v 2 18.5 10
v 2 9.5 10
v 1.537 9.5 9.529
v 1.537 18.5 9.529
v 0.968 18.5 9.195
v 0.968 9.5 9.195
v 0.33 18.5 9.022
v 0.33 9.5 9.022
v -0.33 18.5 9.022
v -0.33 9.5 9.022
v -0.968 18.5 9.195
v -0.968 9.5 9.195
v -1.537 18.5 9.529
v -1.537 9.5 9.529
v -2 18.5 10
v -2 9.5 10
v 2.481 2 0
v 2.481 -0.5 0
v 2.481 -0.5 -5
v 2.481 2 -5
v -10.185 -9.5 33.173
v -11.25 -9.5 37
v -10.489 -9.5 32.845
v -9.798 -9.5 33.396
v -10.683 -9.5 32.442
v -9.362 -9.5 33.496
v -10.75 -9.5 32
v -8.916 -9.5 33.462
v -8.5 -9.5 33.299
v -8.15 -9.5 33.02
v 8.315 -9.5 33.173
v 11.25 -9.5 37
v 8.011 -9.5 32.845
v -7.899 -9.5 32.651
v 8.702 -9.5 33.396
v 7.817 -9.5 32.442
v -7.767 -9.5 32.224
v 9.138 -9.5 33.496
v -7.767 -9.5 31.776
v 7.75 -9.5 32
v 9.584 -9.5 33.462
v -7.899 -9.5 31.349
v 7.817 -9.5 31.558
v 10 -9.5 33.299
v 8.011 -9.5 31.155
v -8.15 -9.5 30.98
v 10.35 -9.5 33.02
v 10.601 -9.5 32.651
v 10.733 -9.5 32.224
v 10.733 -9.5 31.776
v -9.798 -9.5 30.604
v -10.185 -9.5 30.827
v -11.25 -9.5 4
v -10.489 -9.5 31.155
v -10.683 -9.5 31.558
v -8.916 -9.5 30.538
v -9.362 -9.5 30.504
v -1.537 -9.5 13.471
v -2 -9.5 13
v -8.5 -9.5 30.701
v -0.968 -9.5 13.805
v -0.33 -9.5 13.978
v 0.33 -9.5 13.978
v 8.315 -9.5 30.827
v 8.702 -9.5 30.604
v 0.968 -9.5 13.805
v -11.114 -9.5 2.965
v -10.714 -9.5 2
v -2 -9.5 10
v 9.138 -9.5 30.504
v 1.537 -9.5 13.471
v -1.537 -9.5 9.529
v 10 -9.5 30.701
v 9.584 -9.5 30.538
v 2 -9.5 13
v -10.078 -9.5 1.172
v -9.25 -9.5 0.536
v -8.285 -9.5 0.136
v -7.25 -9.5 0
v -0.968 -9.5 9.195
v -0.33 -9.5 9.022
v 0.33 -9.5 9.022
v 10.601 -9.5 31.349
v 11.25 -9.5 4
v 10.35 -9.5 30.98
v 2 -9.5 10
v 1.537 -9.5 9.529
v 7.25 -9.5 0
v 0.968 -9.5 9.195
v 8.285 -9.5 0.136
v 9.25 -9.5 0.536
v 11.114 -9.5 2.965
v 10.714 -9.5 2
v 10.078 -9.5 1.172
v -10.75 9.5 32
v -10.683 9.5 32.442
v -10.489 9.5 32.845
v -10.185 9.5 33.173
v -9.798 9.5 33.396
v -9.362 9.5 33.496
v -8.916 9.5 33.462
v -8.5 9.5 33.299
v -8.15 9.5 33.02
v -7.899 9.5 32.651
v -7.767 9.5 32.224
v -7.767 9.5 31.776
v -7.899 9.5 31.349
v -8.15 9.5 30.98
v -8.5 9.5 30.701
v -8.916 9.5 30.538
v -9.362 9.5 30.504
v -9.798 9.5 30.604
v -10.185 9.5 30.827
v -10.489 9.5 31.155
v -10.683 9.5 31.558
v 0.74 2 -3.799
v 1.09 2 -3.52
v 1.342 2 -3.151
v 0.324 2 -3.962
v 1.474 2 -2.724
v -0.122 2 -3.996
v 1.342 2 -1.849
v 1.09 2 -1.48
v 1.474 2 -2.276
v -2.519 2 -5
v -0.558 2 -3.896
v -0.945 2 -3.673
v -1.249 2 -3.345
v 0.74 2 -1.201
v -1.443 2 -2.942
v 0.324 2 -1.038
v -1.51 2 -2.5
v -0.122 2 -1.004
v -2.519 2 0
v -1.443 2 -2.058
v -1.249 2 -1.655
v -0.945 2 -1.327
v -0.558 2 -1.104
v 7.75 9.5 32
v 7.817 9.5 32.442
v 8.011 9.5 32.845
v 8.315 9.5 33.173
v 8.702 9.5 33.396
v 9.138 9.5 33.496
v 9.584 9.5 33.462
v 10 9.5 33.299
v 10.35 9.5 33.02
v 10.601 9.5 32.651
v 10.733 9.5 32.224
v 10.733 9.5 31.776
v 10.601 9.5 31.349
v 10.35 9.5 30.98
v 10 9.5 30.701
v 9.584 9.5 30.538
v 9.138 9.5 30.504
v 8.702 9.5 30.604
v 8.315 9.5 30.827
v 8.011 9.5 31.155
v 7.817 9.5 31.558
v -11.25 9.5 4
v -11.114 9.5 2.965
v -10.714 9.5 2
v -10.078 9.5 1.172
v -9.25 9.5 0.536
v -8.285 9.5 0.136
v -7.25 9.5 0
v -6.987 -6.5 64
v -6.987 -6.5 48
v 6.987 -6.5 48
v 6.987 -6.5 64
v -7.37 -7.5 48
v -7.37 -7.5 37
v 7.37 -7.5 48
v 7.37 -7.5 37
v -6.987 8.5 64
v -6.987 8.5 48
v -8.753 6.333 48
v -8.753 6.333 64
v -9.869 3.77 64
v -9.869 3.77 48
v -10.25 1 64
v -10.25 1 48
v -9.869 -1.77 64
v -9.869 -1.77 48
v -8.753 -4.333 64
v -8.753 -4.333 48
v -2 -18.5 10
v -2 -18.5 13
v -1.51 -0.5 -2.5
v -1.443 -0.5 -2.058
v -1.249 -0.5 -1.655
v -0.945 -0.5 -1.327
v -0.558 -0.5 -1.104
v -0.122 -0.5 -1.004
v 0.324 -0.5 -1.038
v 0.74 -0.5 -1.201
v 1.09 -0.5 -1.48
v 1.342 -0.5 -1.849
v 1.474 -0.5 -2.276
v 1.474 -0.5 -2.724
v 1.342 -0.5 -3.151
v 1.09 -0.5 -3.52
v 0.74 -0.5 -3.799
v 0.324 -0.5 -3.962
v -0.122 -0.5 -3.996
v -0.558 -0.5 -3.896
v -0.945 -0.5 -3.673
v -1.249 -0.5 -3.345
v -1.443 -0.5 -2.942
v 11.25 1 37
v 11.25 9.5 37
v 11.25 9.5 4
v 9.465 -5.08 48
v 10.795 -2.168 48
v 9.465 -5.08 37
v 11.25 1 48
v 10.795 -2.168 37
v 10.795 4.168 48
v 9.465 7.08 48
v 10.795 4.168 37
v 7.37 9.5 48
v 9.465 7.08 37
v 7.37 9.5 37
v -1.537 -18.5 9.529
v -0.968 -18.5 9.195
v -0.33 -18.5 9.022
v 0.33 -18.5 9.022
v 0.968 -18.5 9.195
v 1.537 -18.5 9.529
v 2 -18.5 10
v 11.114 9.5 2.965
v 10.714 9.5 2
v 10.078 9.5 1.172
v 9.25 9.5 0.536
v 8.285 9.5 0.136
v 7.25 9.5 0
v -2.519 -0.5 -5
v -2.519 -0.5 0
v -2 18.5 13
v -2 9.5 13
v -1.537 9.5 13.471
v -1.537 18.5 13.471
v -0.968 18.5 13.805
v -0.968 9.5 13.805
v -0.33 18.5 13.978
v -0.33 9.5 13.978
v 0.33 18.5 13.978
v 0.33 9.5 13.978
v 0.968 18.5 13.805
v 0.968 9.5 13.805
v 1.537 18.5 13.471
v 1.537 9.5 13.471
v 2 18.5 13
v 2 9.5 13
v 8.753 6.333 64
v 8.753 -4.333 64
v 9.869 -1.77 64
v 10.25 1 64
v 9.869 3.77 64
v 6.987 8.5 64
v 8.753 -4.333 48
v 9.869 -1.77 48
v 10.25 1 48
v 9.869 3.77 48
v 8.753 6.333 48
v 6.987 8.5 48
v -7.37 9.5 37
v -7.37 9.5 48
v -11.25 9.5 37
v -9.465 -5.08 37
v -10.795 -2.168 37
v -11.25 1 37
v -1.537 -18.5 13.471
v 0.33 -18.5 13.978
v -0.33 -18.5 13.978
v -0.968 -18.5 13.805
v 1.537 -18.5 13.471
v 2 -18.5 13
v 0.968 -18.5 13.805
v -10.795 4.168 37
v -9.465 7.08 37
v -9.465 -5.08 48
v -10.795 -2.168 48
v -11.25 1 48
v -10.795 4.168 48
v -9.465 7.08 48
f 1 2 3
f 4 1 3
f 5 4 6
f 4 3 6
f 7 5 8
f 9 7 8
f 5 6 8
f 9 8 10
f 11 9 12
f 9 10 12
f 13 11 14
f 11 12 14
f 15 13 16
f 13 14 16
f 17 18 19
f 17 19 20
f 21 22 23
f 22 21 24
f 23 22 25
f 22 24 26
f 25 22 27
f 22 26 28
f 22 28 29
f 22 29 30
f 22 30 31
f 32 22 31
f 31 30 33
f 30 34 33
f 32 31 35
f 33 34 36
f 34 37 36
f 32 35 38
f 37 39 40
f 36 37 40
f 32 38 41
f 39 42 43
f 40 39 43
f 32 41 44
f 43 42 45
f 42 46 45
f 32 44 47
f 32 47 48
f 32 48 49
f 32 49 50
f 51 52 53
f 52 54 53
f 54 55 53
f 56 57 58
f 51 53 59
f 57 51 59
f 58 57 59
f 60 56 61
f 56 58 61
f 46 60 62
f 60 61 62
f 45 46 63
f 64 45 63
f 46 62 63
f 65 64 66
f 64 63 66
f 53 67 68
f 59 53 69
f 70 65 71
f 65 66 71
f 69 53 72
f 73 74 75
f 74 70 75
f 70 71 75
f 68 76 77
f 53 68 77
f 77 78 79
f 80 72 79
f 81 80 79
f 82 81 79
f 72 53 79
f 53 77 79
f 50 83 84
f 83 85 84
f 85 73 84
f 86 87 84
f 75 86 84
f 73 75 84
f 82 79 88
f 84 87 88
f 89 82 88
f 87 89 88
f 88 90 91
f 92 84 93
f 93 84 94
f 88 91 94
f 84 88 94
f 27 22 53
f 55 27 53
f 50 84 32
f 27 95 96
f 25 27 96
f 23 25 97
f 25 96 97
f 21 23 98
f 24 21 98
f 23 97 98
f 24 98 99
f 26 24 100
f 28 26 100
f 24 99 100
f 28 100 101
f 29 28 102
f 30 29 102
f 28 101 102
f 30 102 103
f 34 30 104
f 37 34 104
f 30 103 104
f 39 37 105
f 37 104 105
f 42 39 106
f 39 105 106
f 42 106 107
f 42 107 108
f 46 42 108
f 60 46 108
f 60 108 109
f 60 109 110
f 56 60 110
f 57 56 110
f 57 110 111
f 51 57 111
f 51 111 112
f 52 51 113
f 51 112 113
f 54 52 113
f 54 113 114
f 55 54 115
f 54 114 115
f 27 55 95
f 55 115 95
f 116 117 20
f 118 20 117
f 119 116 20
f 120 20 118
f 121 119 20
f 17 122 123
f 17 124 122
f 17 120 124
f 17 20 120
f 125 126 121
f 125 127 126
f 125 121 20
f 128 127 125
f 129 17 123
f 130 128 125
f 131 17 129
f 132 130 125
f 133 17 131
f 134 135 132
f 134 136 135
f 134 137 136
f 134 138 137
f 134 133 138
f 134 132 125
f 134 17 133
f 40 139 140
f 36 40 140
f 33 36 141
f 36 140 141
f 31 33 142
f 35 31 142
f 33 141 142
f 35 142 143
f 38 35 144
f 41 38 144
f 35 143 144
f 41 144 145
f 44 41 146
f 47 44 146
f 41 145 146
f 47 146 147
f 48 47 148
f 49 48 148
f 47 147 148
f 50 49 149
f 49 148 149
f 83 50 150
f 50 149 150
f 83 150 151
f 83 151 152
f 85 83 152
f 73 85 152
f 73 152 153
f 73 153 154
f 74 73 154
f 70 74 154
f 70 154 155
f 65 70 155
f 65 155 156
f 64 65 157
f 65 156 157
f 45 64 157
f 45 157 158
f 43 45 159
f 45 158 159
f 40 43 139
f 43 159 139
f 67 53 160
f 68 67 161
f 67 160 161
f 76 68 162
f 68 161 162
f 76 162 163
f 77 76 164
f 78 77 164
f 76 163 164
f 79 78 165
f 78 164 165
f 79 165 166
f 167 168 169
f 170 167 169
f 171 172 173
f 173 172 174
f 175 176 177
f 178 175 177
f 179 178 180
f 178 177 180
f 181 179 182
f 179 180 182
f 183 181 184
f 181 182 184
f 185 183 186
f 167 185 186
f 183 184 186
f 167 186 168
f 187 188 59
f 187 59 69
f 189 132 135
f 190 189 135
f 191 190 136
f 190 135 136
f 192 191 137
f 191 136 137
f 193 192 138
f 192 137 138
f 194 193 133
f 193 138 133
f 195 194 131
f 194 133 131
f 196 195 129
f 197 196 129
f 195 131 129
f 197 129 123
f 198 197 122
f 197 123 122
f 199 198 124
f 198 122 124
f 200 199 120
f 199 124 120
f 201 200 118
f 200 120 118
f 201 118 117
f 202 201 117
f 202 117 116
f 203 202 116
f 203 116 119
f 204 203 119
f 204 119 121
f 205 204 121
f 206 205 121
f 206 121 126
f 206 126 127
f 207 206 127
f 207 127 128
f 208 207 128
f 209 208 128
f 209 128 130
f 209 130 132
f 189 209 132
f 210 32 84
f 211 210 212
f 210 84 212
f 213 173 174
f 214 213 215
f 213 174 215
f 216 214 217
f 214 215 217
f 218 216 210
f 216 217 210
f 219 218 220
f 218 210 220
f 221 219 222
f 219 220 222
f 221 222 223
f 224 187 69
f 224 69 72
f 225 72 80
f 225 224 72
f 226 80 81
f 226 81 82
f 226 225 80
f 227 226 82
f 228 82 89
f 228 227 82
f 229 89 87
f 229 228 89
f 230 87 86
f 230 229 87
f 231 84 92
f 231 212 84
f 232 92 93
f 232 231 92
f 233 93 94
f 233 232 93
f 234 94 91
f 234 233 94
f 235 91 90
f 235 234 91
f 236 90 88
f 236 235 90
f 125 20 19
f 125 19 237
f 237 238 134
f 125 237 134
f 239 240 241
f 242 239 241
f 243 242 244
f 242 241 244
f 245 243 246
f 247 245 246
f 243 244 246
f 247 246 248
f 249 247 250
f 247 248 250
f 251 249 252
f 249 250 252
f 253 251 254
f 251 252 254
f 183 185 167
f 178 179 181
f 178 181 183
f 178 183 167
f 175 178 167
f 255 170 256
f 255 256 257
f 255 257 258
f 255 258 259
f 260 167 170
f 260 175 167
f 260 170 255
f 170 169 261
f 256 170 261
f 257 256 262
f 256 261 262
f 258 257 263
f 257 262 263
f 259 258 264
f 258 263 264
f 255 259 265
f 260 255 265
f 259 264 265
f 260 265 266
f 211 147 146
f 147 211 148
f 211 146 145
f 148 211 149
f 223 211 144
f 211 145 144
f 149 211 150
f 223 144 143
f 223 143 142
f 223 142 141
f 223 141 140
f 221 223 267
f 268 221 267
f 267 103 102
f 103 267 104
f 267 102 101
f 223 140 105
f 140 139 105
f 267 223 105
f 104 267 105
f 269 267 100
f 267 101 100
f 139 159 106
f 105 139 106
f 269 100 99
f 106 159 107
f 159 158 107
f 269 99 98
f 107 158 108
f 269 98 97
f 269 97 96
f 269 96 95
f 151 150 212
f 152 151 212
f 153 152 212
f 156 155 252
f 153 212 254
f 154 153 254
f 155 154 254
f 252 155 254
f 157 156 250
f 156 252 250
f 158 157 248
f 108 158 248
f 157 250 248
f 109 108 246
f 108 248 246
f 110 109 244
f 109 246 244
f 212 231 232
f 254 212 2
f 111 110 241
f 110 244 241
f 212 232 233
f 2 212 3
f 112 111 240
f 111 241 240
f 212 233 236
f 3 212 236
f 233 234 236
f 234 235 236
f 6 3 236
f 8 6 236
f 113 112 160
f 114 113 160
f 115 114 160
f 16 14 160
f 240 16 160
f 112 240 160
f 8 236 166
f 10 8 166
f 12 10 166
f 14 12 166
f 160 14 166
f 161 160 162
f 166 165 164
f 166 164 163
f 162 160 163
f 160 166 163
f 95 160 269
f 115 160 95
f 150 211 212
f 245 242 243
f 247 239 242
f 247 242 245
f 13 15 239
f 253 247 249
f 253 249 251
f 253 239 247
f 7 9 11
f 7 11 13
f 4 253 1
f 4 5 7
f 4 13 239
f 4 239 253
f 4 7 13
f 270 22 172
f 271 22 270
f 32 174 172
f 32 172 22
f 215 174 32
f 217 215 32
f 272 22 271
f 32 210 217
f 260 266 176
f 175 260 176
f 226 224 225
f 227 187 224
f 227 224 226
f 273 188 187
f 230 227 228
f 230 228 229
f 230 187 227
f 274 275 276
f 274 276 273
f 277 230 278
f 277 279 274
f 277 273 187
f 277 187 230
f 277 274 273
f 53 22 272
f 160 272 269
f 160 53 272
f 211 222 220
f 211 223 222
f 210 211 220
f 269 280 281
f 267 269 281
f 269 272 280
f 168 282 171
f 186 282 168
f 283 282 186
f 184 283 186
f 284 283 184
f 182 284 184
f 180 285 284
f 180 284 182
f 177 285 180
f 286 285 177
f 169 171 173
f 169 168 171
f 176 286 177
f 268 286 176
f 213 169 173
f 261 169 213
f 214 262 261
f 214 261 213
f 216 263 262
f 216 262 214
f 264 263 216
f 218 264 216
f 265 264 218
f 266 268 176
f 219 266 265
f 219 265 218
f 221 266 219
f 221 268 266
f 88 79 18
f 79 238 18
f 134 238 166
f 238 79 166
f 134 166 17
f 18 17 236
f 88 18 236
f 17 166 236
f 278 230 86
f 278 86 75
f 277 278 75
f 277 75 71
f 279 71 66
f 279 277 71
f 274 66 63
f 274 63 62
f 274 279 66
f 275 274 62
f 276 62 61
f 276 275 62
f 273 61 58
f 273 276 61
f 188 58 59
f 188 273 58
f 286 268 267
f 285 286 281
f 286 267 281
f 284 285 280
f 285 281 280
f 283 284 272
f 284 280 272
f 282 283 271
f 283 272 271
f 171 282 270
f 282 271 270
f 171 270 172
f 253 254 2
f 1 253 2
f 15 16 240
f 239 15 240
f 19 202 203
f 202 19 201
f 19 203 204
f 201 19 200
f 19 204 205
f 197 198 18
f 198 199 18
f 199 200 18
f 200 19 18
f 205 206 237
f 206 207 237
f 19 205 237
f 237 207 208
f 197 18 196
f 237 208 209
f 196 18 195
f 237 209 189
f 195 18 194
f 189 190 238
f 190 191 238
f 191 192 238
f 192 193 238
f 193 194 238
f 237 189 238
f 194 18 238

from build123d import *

# Parameters (mm, degrees)
SKETCH1_W           = 22.5
SKETCH1_H           = 19
BOSS_EXTRUDE1_DEPTH = 37
BOSS_EXTRUDE2_DEPTH = 11
BOSS_EXTRUDE3_DEPTH = 16
FILLET1_R           = 4
SKETCH6_W           = 5
SKETCH6_H           = 2.5
BOSS_EXTRUDE4_DEPTH = 5
SKETCH7_R           = 1.5
CUT_EXTRUDE1_DEPTH  = 5
SKETCH5_R           = 1.5
CUT_EXTRUDE3_DEPTH  = 19
BOSS_EXTRUDE5_DEPTH = 9
BOSS_EXTRUDE6_START = 9
BOSS_EXTRUDE6_DEPTH = 9


with BuildPart() as part:
    # Sketch1 → Boss-Extrude1 (new body)
    with BuildSketch(Plane.XY):
        Rectangle(SKETCH1_W, SKETCH1_H)
    extrude(amount=BOSS_EXTRUDE1_DEPTH)

    # Sketch3 → Boss-Extrude2 (add)
    with BuildSketch(Plane.XY.offset(37)):
        with BuildLine():
            ThreePointArc((-7.369701486, 9.5), (-11.25, 1), (-7.369701486, -7.5))
            Line((-7.369701486, -7.5), (7.369701486, -7.5))
            ThreePointArc((7.369701486, -7.5), (11.25, 1), (7.369701486, 9.5))
            Line((7.369701486, 9.5), (-7.369701486, 9.5))
        make_face()
    extrude(amount=BOSS_EXTRUDE2_DEPTH)

    # Sketch4 → Boss-Extrude3 (add)
    with BuildSketch(Plane.XY.offset(48)):
        with BuildLine():
            Line((5.23171695, 8.5), (-2.076174526, 8.5))
            Line((-2.076174526, 8.5), (-6.986594306, 8.5))
            ThreePointArc((-6.986594306, 8.5), (-10.25, 1), (-6.986594306, -6.5))
            Line((-6.986594306, -6.5), (-5.941237129, -6.5))
            Line((-5.941237129, -6.5), (4.647085632, -6.5))
            Line((4.647085632, -6.5), (6.986594306, -6.5))
            ThreePointArc((6.986594306, -6.5), (10.25, 1), (6.986594306, 8.5))
            Line((6.986594306, 8.5), (5.23171695, 8.5))
        make_face()
    extrude(amount=BOSS_EXTRUDE3_DEPTH)

    # Fillet1
    fillet1_edges = [part.edges().sort_by_distance(p)[0] for p in [
        (11.25, 0, 0),
        (-11.25, 0, 0),
    ]]
    fillet(fillet1_edges, radius=FILLET1_R)

    # Sketch6 → Boss-Extrude4 (add)
    with BuildSketch(Plane(origin=(0, 0, 0), x_dir=(-1, 0, 0), z_dir=(0, 0, -1))):
        with Locations((0.019167068, 0.75)):
            Rectangle(SKETCH6_W, SKETCH6_H)
    extrude(amount=BOSS_EXTRUDE4_DEPTH)

    # Sketch7 → Cut-Extrude1 (cut)
    with BuildSketch(Plane(origin=(0, 2, 0), x_dir=(1, 0, 0), z_dir=(0, 1, 0))):
        with Locations((-0.009583534, 2.5)):
            Circle(SKETCH7_R)
    extrude(amount=-CUT_EXTRUDE1_DEPTH, mode=Mode.SUBTRACT)

    # Sketch5 → Cut-Extrude3 (cut)
    with BuildSketch(Plane(origin=(0, 9.5, 0), x_dir=(1, 0, 0), z_dir=(0, 1, 0))):
        with Locations((-9.25, -32)):
            Circle(SKETCH5_R)
        with Locations((9.25, -32)):
            Circle(SKETCH5_R)
    extrude(amount=-CUT_EXTRUDE3_DEPTH, mode=Mode.SUBTRACT)

    # Sketch5<5> → Boss-Extrude5 (add)
    with BuildSketch(Plane(origin=(0, 9.5, 0), x_dir=(1, 0, 0), z_dir=(0, 1, 0))):
        with BuildLine():
            Line((-2, -10), (-2, -13))
            ThreePointArc((-2, -13), (0, -14), (2, -13))
            Line((2, -13), (2, -10))
            ThreePointArc((2, -10), (0, -9), (-2, -10))
        make_face()
    extrude(amount=BOSS_EXTRUDE5_DEPTH)

    # Sketch8 → Boss-Extrude6 (add)
    with BuildSketch(Plane.XZ.offset(9.5).offset(BOSS_EXTRUDE6_START)):
        with BuildLine():
            Line((-2, 13), (-2, 10))
            ThreePointArc((-2, 10), (0, 9), (2, 10))
            Line((2, 10), (2, 13))
            ThreePointArc((2, 13), (0, 14), (-2, 13))
        make_face()
    extrude(amount=-BOSS_EXTRUDE6_DEPTH)


solid = part.part
